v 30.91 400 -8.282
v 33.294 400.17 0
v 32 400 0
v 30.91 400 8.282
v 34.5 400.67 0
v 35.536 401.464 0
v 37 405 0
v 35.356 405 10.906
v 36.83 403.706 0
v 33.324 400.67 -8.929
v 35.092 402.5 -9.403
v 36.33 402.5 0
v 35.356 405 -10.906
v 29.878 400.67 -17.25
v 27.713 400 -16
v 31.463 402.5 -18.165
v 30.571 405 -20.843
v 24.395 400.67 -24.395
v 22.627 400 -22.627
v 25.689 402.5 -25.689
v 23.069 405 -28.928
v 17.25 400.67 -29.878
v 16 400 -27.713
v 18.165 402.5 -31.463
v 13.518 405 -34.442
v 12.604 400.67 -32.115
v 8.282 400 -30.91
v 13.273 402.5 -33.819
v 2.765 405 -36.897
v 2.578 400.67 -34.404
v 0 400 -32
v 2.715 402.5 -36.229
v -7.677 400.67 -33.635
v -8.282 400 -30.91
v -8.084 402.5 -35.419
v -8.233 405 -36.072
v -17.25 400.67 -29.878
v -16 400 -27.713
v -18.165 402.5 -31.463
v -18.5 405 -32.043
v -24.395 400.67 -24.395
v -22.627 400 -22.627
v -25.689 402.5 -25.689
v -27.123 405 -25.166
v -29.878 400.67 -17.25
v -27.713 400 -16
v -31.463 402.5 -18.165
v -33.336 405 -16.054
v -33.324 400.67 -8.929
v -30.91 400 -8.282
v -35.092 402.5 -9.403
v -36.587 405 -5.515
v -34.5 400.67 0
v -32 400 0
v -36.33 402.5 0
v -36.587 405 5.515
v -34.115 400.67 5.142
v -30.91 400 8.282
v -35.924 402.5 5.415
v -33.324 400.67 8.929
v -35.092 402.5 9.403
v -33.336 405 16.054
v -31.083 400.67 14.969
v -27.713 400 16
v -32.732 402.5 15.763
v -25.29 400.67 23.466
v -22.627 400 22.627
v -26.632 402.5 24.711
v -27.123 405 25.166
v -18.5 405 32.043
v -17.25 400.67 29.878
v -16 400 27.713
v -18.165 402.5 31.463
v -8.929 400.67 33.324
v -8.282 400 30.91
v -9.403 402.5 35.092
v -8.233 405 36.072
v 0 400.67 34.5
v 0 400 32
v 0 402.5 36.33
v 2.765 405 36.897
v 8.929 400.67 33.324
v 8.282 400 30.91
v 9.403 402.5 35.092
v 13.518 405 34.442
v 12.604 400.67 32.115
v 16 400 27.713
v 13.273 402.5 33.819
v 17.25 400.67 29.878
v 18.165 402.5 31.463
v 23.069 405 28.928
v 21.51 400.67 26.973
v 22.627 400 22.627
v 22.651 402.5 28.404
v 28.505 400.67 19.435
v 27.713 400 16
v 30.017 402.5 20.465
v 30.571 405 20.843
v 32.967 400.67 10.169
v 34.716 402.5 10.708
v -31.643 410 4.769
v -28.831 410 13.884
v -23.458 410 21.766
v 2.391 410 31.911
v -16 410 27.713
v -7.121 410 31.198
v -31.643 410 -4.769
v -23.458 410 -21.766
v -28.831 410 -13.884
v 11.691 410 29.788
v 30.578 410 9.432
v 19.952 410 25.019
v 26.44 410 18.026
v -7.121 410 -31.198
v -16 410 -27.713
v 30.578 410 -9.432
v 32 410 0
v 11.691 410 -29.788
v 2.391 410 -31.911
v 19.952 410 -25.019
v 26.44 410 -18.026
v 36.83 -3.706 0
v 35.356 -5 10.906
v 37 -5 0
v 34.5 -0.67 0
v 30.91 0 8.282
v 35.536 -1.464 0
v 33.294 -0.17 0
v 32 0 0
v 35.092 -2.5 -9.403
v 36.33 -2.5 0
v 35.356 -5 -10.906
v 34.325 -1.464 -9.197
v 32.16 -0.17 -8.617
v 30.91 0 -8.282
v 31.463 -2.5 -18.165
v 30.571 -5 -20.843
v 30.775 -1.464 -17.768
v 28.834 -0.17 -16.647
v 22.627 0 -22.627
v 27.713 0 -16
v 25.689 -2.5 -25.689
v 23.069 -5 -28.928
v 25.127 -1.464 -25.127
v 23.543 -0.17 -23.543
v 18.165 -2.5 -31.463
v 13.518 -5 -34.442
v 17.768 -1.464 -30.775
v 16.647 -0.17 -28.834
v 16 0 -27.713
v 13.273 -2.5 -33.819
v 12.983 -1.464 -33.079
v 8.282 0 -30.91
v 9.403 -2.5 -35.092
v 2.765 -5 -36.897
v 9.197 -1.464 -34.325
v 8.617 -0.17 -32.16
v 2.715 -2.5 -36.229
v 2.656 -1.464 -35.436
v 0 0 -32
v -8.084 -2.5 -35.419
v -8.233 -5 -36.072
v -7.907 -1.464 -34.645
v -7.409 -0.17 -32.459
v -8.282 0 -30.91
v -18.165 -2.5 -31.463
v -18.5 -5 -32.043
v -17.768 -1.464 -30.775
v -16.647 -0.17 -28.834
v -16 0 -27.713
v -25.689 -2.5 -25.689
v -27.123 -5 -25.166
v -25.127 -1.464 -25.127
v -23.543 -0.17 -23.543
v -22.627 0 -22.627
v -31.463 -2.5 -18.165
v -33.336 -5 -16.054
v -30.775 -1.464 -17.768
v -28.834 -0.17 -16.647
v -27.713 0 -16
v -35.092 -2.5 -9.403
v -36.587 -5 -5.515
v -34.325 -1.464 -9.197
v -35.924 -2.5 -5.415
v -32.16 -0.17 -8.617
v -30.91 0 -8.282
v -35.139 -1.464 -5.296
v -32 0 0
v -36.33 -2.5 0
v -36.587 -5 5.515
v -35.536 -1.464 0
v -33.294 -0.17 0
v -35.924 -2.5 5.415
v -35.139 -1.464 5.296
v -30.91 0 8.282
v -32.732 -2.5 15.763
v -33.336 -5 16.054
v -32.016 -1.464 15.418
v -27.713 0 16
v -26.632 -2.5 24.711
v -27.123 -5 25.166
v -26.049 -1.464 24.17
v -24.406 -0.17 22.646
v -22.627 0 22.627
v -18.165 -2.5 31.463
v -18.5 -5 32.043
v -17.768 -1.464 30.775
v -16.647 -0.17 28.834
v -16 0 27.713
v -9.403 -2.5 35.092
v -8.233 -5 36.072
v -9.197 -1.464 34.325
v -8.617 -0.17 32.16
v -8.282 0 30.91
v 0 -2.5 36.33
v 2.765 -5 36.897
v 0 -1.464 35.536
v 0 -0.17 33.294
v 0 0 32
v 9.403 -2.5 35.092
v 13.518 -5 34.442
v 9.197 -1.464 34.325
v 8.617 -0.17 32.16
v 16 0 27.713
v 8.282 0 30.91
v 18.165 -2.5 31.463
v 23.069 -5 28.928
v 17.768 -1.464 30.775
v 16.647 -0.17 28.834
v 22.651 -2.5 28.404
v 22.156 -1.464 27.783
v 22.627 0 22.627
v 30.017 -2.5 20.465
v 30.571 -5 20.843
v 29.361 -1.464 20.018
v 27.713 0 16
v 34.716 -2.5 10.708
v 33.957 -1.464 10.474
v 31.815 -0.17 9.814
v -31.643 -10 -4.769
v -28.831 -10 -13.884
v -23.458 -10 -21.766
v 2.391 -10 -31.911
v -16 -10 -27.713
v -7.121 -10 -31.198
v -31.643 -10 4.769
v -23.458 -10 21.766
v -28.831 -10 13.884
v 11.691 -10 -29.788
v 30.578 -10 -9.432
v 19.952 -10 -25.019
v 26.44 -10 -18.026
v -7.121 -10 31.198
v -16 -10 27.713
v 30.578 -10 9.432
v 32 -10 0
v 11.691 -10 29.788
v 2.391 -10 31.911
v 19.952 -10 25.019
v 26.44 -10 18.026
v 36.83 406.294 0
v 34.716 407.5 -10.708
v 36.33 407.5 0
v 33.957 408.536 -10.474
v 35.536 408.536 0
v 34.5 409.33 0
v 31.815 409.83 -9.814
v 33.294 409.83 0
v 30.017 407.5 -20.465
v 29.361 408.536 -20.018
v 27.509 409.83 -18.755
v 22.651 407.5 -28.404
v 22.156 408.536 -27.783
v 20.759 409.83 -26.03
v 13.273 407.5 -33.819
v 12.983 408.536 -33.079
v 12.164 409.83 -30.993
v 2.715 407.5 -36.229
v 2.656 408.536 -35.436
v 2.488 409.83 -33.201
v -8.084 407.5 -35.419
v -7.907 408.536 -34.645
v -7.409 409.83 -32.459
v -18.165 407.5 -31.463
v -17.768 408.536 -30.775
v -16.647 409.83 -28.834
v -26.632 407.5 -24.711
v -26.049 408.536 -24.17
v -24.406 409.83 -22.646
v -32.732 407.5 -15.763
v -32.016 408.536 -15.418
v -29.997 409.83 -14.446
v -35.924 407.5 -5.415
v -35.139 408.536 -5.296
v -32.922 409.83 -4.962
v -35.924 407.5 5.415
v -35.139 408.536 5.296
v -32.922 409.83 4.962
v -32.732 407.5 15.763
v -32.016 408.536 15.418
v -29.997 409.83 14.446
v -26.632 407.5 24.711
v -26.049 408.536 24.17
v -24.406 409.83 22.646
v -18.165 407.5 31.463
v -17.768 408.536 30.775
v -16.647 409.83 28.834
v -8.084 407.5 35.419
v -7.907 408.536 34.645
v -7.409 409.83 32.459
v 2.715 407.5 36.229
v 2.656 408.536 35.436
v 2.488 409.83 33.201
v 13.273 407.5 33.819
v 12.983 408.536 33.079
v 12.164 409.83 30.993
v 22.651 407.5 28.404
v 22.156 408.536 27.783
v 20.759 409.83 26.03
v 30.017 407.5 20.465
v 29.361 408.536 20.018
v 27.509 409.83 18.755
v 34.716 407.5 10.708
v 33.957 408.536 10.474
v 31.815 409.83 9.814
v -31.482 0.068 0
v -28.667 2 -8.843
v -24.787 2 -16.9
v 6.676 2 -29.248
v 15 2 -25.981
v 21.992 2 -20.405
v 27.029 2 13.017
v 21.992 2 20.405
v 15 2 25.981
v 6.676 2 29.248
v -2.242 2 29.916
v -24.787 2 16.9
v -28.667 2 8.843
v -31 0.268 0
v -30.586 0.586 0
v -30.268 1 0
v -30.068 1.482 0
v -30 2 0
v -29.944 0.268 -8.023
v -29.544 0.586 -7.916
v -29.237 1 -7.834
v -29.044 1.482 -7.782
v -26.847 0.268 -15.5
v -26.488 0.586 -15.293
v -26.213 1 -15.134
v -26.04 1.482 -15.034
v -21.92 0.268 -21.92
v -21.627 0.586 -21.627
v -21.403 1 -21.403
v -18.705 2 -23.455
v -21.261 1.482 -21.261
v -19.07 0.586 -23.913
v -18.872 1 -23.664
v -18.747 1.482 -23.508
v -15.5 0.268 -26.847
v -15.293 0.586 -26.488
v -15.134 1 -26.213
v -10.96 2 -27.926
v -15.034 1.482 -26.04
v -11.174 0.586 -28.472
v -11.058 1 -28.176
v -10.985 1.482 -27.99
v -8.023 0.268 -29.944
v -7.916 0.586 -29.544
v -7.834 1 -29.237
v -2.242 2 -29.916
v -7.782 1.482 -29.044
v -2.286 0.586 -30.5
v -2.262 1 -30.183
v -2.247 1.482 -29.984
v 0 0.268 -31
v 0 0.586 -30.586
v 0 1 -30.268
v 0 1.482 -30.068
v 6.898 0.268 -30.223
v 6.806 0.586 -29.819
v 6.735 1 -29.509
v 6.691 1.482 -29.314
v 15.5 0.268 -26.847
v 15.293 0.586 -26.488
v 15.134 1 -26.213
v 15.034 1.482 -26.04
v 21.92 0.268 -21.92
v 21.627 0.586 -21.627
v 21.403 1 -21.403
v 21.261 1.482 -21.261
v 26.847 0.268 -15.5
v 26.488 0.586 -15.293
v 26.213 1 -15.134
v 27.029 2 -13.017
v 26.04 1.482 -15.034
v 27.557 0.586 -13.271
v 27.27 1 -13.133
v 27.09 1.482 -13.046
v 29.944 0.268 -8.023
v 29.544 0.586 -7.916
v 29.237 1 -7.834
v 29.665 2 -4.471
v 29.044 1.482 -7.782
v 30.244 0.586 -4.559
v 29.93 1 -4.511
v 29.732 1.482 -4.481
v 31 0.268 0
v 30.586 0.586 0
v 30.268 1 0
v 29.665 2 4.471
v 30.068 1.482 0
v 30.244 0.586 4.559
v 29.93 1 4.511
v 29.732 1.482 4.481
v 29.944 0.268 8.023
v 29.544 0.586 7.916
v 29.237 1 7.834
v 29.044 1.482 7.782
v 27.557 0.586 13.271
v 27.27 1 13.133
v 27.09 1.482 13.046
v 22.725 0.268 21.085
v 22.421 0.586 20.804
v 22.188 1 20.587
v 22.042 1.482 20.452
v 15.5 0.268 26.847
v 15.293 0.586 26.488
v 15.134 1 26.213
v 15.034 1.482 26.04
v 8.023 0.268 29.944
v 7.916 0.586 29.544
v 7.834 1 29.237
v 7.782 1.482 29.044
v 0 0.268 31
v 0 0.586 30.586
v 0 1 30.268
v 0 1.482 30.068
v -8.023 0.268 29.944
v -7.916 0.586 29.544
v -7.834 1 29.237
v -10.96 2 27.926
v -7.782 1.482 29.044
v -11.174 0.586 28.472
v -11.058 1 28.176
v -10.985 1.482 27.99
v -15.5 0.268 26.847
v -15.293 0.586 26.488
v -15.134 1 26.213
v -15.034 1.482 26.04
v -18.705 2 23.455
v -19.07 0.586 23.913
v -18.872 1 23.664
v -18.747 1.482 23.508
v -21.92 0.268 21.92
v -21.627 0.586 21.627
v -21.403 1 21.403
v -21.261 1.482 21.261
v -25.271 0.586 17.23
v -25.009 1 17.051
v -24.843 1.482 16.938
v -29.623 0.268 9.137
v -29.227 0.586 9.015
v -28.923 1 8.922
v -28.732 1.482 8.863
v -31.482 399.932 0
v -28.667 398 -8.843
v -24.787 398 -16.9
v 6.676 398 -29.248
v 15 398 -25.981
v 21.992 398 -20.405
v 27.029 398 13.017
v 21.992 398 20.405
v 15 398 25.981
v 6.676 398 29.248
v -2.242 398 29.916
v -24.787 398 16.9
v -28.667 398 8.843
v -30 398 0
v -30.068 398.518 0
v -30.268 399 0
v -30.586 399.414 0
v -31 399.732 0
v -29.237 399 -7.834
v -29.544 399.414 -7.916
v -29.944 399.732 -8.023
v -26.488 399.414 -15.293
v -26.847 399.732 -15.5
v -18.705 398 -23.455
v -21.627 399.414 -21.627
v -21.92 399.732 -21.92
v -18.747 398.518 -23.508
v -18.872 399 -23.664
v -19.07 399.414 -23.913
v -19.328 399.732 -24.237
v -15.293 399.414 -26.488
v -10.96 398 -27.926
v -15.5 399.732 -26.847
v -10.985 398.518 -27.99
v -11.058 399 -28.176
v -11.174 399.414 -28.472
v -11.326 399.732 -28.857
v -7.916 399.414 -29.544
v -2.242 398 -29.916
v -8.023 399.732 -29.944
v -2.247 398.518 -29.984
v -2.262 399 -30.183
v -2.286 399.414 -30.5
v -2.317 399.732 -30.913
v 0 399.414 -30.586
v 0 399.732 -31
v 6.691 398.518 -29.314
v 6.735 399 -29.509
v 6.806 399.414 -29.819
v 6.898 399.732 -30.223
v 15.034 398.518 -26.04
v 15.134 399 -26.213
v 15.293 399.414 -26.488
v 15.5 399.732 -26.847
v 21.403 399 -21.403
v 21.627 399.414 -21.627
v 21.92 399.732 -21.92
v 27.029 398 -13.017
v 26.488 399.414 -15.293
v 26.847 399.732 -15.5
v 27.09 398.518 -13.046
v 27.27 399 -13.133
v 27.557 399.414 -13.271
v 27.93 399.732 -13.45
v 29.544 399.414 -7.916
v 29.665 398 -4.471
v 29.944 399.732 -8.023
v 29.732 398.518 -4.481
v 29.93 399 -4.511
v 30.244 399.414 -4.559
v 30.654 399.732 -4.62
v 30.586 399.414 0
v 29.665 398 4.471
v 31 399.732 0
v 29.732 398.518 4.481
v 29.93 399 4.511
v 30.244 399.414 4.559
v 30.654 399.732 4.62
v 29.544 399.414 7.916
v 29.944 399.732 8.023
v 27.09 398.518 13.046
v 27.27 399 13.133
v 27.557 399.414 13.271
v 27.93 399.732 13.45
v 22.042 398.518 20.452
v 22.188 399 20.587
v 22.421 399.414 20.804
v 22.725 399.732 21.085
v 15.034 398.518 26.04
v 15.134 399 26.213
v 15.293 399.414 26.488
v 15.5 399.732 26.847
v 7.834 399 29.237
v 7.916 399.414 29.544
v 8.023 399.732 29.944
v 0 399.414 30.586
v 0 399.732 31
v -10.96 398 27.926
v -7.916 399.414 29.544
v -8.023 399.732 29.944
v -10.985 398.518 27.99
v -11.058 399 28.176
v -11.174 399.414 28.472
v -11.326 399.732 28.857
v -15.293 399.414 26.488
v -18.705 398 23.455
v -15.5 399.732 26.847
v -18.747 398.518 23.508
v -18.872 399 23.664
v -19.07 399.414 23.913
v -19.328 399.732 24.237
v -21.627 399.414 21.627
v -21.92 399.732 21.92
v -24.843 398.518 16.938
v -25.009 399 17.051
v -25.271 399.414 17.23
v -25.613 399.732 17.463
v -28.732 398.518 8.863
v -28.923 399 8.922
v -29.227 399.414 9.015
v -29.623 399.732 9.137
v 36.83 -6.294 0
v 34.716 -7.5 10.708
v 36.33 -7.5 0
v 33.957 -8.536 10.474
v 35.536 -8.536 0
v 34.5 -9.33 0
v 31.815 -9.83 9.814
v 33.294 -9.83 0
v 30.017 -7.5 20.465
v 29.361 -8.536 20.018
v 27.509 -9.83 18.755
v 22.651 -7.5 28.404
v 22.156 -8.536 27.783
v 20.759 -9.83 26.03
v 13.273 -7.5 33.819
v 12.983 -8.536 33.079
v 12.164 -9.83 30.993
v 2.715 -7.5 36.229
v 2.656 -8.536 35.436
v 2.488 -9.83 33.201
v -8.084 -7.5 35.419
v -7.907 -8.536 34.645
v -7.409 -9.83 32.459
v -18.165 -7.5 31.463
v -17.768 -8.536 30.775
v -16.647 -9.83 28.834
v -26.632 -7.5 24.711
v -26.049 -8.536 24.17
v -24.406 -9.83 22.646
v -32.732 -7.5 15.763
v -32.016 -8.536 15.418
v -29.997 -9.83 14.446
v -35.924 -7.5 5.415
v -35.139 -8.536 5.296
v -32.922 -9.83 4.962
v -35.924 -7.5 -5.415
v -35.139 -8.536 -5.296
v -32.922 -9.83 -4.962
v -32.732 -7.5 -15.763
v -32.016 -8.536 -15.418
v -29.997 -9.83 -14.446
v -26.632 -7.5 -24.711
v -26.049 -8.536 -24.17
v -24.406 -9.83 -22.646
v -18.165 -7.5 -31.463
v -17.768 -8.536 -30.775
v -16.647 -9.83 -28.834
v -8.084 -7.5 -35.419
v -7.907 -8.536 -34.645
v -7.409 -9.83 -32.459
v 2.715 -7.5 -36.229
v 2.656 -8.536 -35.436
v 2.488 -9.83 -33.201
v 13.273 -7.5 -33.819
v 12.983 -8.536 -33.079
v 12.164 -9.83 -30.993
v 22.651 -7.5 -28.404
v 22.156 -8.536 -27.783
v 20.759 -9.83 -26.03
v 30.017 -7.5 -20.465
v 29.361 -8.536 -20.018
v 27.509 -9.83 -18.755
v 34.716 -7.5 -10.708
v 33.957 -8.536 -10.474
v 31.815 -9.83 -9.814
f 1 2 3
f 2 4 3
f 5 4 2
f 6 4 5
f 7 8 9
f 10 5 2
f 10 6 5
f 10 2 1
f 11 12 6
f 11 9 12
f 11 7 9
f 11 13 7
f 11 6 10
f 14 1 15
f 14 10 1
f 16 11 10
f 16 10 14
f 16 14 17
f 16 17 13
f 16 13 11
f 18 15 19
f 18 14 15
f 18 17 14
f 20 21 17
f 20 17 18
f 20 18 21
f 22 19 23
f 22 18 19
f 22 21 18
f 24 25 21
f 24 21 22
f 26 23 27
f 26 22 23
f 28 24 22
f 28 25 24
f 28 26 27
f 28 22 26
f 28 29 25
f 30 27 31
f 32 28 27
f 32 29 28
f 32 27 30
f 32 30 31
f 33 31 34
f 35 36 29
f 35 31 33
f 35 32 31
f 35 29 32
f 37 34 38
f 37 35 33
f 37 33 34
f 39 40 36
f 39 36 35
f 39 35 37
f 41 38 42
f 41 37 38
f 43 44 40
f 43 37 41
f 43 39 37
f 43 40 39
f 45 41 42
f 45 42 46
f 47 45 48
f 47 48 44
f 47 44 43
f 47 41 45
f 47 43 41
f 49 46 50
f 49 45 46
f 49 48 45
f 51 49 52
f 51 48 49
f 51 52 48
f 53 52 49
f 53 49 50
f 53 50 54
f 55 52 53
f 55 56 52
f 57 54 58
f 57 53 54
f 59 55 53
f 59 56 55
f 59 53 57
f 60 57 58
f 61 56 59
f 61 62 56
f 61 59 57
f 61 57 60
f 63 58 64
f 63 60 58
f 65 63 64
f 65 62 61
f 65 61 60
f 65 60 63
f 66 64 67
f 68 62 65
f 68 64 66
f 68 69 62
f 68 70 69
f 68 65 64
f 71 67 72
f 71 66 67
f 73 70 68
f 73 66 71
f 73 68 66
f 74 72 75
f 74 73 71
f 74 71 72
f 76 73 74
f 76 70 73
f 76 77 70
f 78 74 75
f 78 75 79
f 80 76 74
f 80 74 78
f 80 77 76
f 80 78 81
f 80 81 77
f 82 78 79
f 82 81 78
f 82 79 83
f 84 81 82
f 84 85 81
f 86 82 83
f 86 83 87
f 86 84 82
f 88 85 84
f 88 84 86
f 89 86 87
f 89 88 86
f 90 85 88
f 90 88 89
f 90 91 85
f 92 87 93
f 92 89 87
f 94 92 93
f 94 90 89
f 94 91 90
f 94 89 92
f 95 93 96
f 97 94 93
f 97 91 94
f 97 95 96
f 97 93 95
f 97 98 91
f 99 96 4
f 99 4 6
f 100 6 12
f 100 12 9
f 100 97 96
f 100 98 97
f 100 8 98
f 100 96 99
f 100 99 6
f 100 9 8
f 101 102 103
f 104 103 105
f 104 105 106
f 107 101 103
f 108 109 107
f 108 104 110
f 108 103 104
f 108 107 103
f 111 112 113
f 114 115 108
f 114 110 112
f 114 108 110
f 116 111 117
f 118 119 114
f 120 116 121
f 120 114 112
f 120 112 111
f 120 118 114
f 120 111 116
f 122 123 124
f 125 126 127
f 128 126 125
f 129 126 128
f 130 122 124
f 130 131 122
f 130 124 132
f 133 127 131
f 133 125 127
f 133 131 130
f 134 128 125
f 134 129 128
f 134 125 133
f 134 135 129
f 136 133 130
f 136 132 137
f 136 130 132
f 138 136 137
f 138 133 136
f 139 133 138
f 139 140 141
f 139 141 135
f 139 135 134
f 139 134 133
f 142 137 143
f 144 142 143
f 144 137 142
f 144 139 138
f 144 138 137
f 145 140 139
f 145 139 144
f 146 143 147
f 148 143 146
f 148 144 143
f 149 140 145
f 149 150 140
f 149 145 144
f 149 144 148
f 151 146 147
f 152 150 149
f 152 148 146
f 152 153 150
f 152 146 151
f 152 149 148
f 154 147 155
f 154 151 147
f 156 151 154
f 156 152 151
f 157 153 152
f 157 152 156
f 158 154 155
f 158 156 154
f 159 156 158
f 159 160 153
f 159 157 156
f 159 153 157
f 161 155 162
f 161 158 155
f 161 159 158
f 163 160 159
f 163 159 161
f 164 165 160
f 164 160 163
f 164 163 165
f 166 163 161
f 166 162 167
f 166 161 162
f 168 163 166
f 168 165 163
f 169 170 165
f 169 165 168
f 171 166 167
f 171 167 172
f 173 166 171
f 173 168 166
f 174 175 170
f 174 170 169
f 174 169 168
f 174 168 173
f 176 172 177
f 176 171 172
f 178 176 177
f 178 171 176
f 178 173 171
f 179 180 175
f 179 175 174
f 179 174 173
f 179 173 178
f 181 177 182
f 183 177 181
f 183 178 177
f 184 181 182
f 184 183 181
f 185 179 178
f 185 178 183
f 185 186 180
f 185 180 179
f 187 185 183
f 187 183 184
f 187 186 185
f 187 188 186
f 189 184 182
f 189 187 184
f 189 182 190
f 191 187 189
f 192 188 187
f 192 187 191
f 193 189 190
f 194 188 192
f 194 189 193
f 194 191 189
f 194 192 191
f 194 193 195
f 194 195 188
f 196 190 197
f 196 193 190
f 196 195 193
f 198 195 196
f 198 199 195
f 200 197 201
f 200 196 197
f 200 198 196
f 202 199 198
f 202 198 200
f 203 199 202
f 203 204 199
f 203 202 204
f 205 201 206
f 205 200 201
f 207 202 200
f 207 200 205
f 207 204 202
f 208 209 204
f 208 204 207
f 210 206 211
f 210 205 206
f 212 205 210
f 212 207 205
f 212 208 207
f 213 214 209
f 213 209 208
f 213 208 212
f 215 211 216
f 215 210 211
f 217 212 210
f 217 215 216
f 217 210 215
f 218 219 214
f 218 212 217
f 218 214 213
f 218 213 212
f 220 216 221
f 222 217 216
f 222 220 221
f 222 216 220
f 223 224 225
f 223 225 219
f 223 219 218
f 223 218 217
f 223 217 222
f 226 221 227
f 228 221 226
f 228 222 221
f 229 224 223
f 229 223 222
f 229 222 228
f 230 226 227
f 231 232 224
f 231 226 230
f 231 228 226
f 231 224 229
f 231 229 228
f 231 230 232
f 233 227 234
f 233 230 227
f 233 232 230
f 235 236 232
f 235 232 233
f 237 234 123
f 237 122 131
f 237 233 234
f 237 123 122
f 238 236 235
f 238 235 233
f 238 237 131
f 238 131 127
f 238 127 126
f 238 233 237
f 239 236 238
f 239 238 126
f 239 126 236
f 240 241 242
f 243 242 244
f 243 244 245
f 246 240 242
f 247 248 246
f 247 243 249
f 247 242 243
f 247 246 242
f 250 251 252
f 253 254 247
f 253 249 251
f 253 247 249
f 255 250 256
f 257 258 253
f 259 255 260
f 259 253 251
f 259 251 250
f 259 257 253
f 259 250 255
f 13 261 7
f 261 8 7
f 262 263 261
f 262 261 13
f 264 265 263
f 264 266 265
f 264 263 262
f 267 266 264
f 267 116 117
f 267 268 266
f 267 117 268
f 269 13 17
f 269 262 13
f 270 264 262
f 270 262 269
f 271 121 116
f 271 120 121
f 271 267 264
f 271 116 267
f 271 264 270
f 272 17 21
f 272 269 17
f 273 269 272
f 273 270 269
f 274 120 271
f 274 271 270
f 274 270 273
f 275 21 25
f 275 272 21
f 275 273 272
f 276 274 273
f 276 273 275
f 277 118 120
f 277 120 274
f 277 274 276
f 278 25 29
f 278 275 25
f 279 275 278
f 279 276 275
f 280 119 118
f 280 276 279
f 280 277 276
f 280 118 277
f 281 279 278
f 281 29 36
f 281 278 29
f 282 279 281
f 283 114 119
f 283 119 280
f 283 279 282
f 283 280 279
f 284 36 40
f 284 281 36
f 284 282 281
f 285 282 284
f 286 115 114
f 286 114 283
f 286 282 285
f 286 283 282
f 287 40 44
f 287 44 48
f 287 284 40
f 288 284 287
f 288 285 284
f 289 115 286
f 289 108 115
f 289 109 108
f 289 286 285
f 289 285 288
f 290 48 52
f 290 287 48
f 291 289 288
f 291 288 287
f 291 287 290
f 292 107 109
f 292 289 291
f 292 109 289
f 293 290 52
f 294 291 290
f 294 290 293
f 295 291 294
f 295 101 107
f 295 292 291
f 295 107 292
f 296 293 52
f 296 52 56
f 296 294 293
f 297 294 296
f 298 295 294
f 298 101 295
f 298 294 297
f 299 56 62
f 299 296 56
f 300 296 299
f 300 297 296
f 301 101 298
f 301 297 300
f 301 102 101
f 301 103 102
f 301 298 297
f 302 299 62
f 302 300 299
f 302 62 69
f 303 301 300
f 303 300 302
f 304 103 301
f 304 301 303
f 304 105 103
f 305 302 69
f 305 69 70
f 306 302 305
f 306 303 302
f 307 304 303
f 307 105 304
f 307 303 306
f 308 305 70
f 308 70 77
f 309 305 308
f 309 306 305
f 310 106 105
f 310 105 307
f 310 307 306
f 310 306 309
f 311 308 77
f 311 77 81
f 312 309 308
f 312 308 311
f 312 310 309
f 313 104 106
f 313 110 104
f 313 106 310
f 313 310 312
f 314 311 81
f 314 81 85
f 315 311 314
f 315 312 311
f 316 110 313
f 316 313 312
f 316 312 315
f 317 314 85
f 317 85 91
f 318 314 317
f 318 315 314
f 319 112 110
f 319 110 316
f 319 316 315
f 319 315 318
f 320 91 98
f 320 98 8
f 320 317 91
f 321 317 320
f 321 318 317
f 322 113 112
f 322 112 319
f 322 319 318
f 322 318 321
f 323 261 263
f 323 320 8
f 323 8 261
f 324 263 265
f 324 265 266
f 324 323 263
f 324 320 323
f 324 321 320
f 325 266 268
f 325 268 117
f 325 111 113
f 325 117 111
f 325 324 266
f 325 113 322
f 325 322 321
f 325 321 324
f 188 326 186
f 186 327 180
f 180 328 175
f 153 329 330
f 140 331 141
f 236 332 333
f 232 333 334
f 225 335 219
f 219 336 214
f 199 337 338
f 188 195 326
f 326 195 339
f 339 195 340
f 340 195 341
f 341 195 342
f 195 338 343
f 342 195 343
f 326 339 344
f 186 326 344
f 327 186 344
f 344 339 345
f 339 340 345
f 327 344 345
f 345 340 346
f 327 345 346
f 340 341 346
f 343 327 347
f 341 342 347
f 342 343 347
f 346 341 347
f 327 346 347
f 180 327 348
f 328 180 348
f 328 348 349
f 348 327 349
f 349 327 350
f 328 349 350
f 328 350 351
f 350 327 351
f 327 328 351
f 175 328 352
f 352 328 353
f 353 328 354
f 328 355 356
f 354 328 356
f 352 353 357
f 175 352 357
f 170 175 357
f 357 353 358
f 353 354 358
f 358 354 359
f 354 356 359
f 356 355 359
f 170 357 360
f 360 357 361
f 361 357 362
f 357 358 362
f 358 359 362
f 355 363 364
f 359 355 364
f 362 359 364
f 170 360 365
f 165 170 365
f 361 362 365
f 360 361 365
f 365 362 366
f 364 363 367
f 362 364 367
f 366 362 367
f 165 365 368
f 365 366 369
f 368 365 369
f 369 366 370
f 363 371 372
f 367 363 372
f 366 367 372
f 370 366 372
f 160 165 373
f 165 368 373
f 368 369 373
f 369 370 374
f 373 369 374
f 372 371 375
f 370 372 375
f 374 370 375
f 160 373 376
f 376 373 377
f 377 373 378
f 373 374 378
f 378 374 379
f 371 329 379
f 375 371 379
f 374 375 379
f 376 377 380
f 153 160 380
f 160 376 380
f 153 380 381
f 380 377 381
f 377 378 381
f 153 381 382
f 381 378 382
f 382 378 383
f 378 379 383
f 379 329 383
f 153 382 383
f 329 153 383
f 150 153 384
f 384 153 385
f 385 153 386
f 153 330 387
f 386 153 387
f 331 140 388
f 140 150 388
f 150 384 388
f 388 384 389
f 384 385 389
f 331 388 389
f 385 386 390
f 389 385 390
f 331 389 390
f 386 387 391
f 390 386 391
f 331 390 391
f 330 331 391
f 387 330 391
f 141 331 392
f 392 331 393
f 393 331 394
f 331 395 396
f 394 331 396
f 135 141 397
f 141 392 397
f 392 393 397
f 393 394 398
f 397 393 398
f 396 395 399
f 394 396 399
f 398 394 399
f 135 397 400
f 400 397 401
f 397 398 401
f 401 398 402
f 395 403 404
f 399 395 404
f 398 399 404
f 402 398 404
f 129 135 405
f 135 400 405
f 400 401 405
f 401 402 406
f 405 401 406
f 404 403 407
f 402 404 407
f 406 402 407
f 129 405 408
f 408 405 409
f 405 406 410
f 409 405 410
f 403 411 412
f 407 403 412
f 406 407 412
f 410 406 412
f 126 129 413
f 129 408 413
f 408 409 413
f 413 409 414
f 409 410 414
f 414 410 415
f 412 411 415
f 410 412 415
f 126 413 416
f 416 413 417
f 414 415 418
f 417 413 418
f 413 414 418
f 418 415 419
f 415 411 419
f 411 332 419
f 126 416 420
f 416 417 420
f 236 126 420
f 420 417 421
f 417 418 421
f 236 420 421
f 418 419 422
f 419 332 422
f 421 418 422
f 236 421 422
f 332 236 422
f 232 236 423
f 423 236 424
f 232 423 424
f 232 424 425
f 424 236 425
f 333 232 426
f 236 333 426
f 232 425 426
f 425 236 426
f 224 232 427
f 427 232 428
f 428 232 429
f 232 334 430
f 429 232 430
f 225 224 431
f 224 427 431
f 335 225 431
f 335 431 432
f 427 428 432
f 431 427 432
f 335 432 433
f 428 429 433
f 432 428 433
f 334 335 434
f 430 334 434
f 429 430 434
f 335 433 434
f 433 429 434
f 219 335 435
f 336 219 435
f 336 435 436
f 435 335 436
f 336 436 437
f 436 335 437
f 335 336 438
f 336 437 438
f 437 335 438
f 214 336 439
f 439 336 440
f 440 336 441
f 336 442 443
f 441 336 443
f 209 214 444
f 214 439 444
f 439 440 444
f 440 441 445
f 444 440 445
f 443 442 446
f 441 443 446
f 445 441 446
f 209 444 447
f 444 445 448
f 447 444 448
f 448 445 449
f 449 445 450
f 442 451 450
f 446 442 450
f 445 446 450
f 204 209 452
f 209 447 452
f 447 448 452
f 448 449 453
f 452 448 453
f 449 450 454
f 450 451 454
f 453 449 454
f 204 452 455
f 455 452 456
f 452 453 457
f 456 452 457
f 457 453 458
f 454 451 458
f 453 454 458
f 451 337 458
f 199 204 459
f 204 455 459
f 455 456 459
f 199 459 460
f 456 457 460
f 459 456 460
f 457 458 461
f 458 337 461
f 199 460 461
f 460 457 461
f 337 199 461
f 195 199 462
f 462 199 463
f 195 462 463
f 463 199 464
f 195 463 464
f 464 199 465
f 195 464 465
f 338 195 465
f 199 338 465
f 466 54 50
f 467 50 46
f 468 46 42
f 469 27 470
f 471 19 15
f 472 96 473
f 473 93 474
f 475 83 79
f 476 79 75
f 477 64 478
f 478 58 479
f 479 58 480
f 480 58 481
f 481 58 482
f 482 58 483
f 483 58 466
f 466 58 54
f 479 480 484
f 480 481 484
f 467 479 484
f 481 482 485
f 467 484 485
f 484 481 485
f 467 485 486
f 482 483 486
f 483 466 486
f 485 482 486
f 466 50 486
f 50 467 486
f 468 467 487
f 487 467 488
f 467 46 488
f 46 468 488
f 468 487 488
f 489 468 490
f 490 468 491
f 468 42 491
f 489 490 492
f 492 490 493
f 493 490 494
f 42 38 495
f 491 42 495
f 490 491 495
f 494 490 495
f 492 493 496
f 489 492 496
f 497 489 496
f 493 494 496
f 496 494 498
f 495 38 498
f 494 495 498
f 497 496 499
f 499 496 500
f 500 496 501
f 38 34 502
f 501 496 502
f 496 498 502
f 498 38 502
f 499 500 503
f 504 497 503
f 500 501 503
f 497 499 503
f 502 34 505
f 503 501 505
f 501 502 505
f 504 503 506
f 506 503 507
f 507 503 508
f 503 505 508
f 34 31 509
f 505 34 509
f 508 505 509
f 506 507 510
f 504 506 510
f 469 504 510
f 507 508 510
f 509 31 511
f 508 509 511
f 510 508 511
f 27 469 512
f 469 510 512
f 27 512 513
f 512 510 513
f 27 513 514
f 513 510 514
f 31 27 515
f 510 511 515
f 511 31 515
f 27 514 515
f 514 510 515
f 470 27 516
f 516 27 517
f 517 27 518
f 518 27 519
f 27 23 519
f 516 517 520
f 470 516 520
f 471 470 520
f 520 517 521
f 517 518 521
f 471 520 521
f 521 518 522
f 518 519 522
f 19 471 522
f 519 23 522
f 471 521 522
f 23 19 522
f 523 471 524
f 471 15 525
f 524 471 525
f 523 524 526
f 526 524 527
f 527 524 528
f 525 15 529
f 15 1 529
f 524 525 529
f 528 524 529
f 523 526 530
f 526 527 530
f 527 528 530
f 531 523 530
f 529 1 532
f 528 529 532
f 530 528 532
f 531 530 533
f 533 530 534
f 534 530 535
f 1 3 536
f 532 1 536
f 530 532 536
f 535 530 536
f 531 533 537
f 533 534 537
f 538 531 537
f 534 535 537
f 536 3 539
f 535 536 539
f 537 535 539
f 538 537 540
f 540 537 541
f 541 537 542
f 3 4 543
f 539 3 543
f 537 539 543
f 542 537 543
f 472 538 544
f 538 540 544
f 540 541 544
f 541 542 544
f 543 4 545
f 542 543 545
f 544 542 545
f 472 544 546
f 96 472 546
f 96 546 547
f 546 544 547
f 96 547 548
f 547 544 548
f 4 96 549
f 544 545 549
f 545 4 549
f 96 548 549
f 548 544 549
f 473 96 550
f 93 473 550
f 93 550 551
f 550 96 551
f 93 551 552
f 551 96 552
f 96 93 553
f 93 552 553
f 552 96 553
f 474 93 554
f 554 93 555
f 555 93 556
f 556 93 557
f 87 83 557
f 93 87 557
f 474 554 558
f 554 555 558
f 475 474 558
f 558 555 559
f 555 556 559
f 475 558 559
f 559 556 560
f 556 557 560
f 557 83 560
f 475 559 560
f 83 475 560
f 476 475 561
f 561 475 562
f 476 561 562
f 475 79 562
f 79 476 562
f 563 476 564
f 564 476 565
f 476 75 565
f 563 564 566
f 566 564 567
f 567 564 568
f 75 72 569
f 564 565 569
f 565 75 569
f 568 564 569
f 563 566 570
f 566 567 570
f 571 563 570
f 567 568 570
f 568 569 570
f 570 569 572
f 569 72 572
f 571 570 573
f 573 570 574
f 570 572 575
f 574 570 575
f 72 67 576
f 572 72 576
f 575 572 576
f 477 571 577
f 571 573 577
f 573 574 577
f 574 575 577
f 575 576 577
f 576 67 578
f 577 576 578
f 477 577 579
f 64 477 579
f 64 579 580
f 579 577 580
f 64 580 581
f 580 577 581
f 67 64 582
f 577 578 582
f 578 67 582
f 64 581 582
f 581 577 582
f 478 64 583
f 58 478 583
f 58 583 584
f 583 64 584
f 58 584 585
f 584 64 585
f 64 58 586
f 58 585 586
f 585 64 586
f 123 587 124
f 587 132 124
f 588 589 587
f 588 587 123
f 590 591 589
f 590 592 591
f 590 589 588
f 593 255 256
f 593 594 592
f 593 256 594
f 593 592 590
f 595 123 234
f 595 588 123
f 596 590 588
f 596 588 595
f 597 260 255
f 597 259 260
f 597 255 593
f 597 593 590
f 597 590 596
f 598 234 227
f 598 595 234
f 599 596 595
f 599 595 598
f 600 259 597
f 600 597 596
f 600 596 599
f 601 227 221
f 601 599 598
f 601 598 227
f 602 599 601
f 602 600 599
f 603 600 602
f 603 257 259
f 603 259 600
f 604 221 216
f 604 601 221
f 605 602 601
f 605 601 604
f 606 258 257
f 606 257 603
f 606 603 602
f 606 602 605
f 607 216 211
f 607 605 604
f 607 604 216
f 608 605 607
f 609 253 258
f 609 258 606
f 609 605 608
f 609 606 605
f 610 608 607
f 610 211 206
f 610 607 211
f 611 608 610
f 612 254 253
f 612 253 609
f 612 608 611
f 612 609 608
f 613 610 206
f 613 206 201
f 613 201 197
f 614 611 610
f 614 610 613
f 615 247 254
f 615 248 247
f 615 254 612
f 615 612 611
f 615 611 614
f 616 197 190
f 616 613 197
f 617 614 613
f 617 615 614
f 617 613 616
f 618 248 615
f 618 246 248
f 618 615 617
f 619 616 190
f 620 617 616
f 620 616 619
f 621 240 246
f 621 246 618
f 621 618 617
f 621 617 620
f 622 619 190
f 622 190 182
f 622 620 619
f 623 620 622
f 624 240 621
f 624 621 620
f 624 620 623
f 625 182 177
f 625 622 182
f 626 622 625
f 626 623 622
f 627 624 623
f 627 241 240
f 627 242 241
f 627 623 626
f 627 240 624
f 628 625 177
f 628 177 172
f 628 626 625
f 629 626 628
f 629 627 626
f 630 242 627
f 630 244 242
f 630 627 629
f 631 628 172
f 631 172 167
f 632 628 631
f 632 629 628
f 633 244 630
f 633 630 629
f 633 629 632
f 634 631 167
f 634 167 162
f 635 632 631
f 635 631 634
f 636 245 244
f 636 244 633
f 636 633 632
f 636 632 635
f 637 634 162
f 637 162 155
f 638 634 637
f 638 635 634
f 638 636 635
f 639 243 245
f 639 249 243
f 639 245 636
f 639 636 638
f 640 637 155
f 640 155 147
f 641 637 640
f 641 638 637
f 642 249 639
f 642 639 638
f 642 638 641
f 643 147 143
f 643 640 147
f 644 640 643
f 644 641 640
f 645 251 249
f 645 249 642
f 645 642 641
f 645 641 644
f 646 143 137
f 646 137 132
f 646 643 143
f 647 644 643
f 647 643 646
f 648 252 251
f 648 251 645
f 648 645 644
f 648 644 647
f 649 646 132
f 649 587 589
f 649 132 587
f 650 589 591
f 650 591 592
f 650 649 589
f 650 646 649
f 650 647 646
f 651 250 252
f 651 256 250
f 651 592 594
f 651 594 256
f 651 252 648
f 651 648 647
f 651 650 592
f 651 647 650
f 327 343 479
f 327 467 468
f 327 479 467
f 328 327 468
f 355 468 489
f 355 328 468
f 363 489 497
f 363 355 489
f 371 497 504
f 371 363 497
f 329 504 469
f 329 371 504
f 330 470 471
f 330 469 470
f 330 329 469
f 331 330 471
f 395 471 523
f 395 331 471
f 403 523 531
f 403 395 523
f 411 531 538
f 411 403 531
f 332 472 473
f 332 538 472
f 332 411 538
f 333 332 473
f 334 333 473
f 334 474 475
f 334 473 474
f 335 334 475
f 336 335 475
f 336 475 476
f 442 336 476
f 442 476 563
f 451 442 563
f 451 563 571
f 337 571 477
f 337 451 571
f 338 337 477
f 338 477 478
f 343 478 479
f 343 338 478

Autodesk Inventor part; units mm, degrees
ref_plane "YZ Plane" through (0, 0, 0) normal (1, 0, 0) x (0, 1, 0)
ref_plane "XZ Plane" through (0, 0, 0) normal (0, 1, 0) x (-1, 0, 0)
ref_plane "XY Plane" through (0, 0, 0) normal (0, 0, 1) x (1, 0, 0)
sketch "草图1" plane through (0, 0, 0) normal (0, 1, 0) x (-1, 0, 0)
  circle A0 centre (0, 0) radius 30
  dimension "d0" = 60
extrude "拉伸1" add sketch "草图1" along normal blind 400
sketch "草图2" plane through (0, 400, 0) normal (0, 1, 0) x (1, 0, 0)
  circle A0 centre (0, 0) radius 37
extrude "拉伸2" add sketch "草图2" along normal blind 10
sketch "草图3" plane through (0, 0, 0) normal (0, -1, 0) x (1, 0, 0)
  circle A0 centre (0, 0) radius 37
extrude "拉伸3" add sketch "草图3" along normal blind 10
fillet "圆角1" radius 5 4 edges at (-37, 410, 0) (-37, 400, 0) (-37, 0, 0) (-37, -10, 0)
fillet "圆角2" radius 2 2 edges at (30, 400, 0) (30, 0, 0)
properties part number "销钉" material "钢，高强度，低合金"
